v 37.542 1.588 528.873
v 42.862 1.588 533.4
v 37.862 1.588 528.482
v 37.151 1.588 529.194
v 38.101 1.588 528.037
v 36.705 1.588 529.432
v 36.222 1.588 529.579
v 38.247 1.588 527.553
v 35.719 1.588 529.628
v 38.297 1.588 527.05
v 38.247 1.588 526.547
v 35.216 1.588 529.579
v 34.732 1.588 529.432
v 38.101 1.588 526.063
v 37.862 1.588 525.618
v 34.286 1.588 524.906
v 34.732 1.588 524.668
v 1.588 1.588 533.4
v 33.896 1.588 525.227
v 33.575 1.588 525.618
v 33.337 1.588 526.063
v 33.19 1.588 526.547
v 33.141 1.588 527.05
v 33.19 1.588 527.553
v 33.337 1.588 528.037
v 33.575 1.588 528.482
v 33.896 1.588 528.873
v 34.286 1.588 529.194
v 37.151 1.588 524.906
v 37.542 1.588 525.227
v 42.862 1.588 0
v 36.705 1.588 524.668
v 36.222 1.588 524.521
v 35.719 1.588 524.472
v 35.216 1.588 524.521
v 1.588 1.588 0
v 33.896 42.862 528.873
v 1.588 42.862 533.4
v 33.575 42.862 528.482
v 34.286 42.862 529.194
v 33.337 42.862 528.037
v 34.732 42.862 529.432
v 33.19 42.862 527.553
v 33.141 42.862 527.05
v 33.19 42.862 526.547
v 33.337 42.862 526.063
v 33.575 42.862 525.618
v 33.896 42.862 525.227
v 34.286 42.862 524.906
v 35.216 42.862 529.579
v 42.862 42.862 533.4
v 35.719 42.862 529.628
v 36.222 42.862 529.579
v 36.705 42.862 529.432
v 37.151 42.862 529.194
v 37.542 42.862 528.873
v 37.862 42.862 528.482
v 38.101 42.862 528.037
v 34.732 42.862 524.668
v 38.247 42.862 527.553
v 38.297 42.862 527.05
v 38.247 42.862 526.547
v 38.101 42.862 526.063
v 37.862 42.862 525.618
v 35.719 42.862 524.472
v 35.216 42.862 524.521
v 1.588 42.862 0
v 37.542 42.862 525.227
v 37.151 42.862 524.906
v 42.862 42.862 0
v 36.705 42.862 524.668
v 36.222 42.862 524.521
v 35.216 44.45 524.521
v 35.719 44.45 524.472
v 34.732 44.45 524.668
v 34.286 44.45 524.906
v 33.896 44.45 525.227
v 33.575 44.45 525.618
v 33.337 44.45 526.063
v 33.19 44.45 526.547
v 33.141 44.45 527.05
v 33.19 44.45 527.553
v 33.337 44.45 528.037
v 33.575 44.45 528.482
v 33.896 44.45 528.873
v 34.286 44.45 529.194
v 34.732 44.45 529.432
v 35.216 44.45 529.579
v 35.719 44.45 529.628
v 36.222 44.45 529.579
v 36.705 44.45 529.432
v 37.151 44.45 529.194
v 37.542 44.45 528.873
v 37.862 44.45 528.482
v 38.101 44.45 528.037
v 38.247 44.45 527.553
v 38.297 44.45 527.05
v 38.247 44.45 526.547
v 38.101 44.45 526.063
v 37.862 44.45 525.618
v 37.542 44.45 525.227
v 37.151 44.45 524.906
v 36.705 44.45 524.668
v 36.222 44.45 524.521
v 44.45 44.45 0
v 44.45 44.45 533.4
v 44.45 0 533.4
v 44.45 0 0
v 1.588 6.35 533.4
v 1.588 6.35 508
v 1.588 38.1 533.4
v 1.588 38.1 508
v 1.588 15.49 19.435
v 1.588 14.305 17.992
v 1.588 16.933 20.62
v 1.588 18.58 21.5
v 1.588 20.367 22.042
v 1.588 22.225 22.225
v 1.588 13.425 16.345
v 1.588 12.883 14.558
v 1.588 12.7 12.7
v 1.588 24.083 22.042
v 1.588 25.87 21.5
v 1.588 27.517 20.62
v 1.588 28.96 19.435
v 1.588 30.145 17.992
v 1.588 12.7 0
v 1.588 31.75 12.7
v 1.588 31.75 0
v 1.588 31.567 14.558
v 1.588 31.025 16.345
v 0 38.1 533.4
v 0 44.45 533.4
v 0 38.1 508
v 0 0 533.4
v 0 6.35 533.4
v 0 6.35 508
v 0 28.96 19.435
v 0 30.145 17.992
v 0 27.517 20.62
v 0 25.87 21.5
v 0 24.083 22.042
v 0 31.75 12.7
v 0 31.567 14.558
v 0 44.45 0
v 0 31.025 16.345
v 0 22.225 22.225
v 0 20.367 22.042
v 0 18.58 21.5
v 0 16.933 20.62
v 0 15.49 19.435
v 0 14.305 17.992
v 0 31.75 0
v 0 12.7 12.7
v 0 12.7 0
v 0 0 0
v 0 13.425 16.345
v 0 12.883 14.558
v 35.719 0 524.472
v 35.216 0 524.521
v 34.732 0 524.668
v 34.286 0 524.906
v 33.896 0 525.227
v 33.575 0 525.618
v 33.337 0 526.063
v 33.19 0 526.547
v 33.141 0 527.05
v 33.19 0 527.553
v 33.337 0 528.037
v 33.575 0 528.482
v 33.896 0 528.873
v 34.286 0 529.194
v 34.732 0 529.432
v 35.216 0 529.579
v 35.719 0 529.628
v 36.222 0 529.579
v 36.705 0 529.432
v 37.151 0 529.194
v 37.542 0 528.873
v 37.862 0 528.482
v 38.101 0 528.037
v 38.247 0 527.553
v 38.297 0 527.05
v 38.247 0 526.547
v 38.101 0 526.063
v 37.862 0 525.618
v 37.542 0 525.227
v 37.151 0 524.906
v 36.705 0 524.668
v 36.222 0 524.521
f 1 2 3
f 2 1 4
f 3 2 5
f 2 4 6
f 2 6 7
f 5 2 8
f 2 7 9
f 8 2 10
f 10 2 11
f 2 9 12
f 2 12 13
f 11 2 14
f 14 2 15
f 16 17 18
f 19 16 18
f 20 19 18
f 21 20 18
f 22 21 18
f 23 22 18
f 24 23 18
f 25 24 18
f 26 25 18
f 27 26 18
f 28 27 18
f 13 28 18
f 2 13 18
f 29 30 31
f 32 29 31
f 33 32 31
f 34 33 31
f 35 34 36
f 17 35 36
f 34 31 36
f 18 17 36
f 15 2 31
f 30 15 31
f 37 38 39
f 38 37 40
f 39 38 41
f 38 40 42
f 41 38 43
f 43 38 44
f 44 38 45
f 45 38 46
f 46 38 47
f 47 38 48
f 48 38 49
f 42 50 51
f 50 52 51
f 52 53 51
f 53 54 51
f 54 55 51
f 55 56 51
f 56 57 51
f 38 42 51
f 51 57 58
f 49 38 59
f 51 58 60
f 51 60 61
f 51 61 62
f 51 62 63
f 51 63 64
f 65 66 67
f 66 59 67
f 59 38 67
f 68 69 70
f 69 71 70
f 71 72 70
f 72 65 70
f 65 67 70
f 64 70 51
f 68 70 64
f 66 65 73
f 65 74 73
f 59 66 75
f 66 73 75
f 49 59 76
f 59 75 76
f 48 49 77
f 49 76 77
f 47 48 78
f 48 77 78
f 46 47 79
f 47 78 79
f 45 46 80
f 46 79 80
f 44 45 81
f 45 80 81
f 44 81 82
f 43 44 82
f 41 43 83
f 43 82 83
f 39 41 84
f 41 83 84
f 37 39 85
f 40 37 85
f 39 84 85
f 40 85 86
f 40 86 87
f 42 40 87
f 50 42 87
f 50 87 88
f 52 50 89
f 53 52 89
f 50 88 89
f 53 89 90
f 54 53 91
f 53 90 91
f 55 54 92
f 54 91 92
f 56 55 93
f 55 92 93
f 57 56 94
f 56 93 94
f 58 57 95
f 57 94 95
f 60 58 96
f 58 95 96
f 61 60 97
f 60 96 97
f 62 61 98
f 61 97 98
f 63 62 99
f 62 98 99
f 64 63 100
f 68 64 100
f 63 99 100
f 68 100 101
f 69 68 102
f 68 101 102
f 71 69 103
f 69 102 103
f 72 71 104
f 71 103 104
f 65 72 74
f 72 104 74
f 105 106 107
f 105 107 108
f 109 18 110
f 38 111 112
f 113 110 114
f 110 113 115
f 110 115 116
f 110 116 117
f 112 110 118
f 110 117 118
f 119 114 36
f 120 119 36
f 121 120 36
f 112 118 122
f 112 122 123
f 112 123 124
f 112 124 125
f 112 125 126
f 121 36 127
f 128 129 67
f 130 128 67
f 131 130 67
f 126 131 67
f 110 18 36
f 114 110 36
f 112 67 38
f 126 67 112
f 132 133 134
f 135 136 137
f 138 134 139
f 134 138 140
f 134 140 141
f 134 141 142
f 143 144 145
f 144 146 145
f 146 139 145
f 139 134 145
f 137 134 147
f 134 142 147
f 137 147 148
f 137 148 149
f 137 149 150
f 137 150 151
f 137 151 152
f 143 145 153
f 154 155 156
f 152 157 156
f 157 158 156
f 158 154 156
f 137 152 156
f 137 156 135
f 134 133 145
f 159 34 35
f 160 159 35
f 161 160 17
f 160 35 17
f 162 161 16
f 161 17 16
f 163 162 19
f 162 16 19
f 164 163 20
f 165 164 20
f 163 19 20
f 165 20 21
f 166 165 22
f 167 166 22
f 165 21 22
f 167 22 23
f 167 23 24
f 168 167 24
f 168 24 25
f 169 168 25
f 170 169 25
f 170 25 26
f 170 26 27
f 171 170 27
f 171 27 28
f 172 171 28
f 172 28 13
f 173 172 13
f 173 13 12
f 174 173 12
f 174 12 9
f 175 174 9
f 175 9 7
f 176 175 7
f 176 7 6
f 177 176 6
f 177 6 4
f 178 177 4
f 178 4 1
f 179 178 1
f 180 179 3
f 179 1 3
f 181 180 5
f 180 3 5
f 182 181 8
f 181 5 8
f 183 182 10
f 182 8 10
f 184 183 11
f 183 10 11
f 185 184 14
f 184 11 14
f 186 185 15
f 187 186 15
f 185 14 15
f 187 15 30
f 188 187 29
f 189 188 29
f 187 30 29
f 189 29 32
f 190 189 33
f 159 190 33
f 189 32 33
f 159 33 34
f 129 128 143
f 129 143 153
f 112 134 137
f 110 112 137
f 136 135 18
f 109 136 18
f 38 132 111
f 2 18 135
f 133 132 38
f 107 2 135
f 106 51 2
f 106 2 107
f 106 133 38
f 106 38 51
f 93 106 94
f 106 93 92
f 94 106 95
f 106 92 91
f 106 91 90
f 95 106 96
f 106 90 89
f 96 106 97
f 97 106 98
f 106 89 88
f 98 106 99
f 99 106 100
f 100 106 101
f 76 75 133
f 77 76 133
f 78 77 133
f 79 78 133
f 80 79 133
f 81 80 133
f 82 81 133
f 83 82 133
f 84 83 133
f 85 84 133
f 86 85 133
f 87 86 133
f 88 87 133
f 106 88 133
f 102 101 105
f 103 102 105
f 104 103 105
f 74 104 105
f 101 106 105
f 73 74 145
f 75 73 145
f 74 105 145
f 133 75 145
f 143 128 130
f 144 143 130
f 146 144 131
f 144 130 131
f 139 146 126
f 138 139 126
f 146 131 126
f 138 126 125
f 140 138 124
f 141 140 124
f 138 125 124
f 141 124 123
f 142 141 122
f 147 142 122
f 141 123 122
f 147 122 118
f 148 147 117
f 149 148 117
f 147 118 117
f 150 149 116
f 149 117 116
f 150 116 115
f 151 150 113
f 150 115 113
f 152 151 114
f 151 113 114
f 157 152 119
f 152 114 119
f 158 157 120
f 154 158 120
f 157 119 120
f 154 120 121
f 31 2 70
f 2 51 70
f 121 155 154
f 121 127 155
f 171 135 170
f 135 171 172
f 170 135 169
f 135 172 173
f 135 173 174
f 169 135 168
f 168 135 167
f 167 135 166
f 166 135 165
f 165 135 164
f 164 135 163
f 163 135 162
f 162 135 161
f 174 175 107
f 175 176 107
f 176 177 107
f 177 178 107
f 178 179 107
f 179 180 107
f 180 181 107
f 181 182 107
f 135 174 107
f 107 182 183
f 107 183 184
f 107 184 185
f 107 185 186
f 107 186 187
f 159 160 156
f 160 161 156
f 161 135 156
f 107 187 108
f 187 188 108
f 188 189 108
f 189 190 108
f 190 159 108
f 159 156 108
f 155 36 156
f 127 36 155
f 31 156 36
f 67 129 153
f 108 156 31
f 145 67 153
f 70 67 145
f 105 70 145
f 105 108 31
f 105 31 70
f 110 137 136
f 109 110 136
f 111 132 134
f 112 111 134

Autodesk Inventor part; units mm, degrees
ref_plane "YZ Plane" through (0, 0, 0) normal (1, 0, 0) x (0, 1, 0)
ref_plane "XZ Plane" through (0, 0, 0) normal (0, 1, 0) x (-1, 0, 0)
ref_plane "XY Plane" through (0, 0, 0) normal (0, 0, 1) x (1, 0, 0)
sketch "Sketch1" plane through (0, 0, 0) normal (0, 0, 1) x (1, 0, 0)
  line L0 (0, 0) -> (44.45, 0)
  line L1 (44.45, 0) -> (44.45, 44.45)
  line L2 (44.45, 44.45) -> (0, 44.45)
  line L3 (0, 44.45) -> (0, 0)
  line L4 (1.5875, 42.8625) -> (42.8625, 42.8625)
  line L5 (42.8625, 42.8625) -> (42.8625, 1.5875)
  line L6 (42.8625, 1.5875) -> (1.5875, 1.5875)
  line L7 (1.5875, 1.5875) -> (1.5875, 42.8625)
  dimension "d0" = 44.45
  dimension "d1" = 44.45
  dimension "d2" = 1.5875
extrude "Extrusion1" add sketch "Sketch1" along normal blind 533.4
sketch "Sketch2" plane through (44.45, 0, 0) normal (1, 0, 0) x (0, 0, -1)
  line L0 (0, 22.225) -> (-12.7, 22.225) construction
  line L1 (0, 12.7) -> (-12.7, 12.7)
  line L2 (-12.7, 31.75) -> (0, 31.75)
  arc A0 (0, 12.7) -> (0, 31.75) centre (0, 22.225) ccw
  arc A1 (-12.7, 31.75) -> (-12.7, 12.7) centre (-12.7, 22.225) ccw
  line L3 (0, 0) -> (0, 44.45) projected
  line L4 (0, 44.45) -> (-533.4, 44.45) projected
  point P0 (-6.35, 22.225)
  dimension "d5" = 0
  dimension "d7" = 19.05
  dimension "d20" = 12.7
  dimension "d21" = 22.225
extrude "Extrusion2" cut sketch "Sketch2" against normal blind 127
sketch "Sketch6" plane through (44.45, 0, 533.4) normal (1, 0, 0) x (0, 0, -1)
  line L0 (533.4, 42.8625) -> (533.4, 31.75) projected
  arc A0 (520.7, 31.75) -> (520.7, 12.7) centre (520.7, 22.225) ccw projected
  line L1 (533.4, 31.75) -> (520.7, 31.75)
  arc A1 (520.7, 31.75) -> (520.7, 12.7) centre (520.7, 22.225) ccw
  line L2 (533.4, 12.7) -> (520.7, 12.7) projected
  line L3 (520.7, 12.7) -> (533.4, 12.7)
  line L4 (533.4, 12.7) -> (533.4, 31.75)
  point P0 (533.4, 0)
extrude "Extrusion3" add sketch "Sketch6" against normal blind 1.5875
sketch "Sketch7" plane through (0, 0, 533.4) normal (-1, 0, 0) x (0, 0, 1)
  line L0 (0, 0) -> (0, 44.45) projected
  line L1 (0, 38.1) -> (-25.4, 38.1)
  line L2 (-25.4, 38.1) -> (-25.4, 6.35)
  line L3 (-25.4, 6.35) -> (0, 6.35)
  line L4 (0, 6.35) -> (0, 38.1)
  line L5 (-39.9502, 6.35) -> (-39.9502, 38.1)
  line L6 (-533.4, 31.75) -> (-520.7, 31.75) projected
  arc A0 (-520.7, 12.7) -> (-520.7, 31.75) centre (-520.7, 22.225) ccw projected
  line L7 (-520.7, 12.7) -> (-533.4, 12.7) projected
  line L8 (-533.4, 12.7) -> (-533.4, 0) projected
  line L9 (-533.4, 0) -> (0, 0) projected
  line L10 (0, 44.45) -> (0, 0) projected
  line L11 (-533.4, 44.45) -> (0, 44.45) projected
  line L12 (-533.4, 44.45) -> (-533.4, 31.75) projected
  dimension "d24" = 25.4
  dimension "d25" = 31.75
  dimension "d26" = 6.35
  dimension "d27" = 6.35
extrude "Extrusion4" cut sketch "Sketch7" against normal blind 1.5875 contours L3 L2 L1 L0
sketch "Sketch8" plane through (0, 0, 0) normal (0, -1, 0) x (1, 0, 0)
  line L0 (44.45, 0) -> (44.45, 533.4) projected
  line L1 (0, 533.4) -> (44.45, 533.4) projected
  point P0 (0, 0)
  point P1 (35.7188, 527.05)
  dimension "d30" = 8.7312
  dimension "d31" = 6.35
hole "Hole2" at (35.7188, 0, 527.05) direction (0, 1, 0) diameter 5.1562 depth 76.2 tip angle 118
equation "\"d26\" = d27"
properties part number "TelescopeOuter" material "Aluminum 6061"
